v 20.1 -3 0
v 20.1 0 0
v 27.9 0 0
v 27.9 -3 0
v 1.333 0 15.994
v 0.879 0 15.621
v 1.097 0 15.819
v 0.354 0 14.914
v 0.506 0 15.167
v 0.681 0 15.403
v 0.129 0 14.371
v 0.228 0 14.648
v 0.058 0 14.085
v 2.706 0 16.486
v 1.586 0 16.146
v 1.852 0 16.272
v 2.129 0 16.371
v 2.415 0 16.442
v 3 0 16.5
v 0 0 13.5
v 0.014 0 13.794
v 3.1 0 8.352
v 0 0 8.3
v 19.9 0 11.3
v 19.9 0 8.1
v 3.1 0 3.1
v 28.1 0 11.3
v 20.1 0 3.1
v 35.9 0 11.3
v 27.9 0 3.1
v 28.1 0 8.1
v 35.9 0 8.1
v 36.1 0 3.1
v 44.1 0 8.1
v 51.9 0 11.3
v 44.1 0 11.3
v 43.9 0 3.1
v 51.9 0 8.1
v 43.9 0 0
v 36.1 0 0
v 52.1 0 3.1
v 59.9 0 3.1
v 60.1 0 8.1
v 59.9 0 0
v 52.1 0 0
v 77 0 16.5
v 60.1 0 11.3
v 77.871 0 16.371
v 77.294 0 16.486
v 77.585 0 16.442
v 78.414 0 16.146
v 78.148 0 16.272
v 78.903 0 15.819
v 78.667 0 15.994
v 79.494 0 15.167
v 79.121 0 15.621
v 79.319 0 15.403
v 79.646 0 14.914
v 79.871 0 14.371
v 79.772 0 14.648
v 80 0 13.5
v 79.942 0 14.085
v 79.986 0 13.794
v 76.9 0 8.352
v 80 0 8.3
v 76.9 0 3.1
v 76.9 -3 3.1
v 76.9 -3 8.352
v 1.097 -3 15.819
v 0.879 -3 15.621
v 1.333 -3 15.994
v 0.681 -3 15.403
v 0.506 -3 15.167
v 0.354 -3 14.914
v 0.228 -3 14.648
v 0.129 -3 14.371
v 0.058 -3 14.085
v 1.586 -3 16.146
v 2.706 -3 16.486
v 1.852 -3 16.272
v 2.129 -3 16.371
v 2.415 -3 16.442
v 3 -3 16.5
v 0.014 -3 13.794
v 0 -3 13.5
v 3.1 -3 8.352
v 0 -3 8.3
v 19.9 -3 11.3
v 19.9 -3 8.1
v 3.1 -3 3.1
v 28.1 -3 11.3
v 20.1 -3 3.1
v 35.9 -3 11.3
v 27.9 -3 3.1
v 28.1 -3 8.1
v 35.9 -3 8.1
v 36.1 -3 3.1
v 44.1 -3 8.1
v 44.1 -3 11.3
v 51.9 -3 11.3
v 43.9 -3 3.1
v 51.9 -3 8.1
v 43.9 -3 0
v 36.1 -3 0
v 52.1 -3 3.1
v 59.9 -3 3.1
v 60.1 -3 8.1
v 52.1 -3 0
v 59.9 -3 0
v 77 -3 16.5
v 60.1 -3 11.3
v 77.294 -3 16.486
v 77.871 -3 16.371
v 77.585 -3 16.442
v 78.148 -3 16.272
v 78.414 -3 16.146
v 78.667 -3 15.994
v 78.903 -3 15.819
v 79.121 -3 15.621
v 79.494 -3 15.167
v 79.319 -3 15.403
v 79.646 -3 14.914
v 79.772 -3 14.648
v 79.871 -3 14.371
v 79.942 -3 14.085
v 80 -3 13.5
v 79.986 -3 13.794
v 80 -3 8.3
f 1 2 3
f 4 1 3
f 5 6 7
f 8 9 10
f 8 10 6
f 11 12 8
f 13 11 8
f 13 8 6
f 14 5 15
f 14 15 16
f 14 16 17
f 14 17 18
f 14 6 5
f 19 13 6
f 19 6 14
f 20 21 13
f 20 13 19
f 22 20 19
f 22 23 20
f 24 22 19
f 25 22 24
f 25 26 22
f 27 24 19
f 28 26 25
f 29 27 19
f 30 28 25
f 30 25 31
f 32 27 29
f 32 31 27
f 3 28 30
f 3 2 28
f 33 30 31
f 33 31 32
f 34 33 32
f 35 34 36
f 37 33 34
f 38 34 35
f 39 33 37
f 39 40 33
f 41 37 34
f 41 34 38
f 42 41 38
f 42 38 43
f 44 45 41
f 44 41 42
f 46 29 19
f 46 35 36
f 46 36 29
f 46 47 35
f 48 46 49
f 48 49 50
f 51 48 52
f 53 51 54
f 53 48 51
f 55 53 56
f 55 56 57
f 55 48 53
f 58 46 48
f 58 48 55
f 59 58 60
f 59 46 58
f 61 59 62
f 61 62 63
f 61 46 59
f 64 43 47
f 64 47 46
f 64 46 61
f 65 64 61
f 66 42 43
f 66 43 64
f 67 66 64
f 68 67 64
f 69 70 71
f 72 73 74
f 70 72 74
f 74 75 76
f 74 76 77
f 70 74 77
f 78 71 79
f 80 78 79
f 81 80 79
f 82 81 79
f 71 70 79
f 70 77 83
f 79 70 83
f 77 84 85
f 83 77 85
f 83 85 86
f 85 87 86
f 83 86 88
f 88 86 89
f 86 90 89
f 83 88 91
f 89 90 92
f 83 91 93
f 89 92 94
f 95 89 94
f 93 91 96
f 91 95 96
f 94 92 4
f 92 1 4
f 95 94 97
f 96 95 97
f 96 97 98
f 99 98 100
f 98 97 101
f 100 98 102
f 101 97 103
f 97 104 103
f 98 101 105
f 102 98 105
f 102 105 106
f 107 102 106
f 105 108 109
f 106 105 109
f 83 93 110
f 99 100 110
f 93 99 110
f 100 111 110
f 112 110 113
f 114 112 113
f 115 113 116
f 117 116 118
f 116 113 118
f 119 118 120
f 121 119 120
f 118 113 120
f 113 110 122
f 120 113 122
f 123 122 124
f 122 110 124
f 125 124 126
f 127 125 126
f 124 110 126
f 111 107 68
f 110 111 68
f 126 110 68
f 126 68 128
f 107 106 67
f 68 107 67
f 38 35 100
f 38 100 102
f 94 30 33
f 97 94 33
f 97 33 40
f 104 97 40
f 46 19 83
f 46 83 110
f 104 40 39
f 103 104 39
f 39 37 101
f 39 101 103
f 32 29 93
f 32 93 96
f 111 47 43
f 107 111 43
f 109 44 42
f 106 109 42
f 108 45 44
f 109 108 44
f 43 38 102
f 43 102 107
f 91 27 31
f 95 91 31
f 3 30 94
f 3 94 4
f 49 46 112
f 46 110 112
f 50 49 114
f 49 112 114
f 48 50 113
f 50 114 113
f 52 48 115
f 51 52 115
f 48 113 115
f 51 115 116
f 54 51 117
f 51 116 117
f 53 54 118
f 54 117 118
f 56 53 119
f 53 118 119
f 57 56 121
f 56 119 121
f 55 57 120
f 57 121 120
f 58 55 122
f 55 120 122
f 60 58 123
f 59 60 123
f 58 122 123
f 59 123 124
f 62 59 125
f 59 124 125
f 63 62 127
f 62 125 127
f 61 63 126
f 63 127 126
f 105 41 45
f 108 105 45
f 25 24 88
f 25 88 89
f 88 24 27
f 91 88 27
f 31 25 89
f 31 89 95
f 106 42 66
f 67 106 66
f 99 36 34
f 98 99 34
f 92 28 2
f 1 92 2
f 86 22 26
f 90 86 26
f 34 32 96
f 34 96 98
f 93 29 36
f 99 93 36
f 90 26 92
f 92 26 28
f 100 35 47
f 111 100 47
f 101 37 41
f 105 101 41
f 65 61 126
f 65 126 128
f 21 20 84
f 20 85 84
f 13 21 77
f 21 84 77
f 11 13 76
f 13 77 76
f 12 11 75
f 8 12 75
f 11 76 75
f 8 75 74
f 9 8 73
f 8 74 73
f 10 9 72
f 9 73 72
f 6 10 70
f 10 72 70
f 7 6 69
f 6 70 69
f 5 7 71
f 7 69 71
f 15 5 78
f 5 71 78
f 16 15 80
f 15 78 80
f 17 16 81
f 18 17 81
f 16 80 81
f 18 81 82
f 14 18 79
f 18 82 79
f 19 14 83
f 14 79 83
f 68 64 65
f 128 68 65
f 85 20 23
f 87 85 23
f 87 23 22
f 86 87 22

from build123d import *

# Parameters (mm, degrees)
SKETCH1_W           = 80
SKETCH1_H           = 16.5
BOSS_EXTRUDE1_DEPTH = 3
SKETCH3_W           = 8.2
SKETCH3_H           = 3.2
CUT_EXTRUDE1_DEPTH  = 4
FILLET1_R           = 3


with BuildPart() as part:
    # Sketch1 → Boss-Extrude1 (new body)
    with BuildSketch(Plane(origin=(0, 0, 0), x_dir=(1, 0, 0), z_dir=(0, 1, 0))):
        with Locations((40, -8.25)):
            Rectangle(SKETCH1_W, SKETCH1_H)
    extrude(amount=-BOSS_EXTRUDE1_DEPTH)

    # Sketch3 → Cut-Extrude1 (cut, through all)
    with BuildSketch(Plane(origin=(0, 0, 0), x_dir=(1, 0, 0), z_dir=(0, 1, 0))):
        with Locations((24, -9.7)):
            Rectangle(SKETCH3_W, SKETCH3_H)
        with Locations((40, -9.7)):
            Rectangle(SKETCH3_W, SKETCH3_H)
        with Locations((32, -1.5)):
            Rectangle(SKETCH3_W, SKETCH3_H)
        with Locations((56, -9.7)):
            Rectangle(SKETCH3_W, SKETCH3_H)
        with Locations((48, -1.5)):
            Rectangle(SKETCH3_W, SKETCH3_H)
        Polygon((76.9, -3.1), (76.9, -8.351680555), (80.1, -8.298347221), (80.1, 0.1), (59.9, 0.1), (59.9, -3.1), align=None)
        Polygon((-0.1, -8.298347221), (3.1, -8.351680555), (3.1, -3.1), (20.1, -3.1), (20.1, 0.1), (-0.1, 0.1), align=None)
    extrude(amount=-CUT_EXTRUDE1_DEPTH, mode=Mode.SUBTRACT)

    # Fillet1
    fillet1_edges = [part.edges().sort_by_distance(p)[0] for p in [
        (80, -1.5, 16.5),
        (0, -1.5, 16.5),
    ]]
    fillet(fillet1_edges, radius=FILLET1_R)


solid = part.part
